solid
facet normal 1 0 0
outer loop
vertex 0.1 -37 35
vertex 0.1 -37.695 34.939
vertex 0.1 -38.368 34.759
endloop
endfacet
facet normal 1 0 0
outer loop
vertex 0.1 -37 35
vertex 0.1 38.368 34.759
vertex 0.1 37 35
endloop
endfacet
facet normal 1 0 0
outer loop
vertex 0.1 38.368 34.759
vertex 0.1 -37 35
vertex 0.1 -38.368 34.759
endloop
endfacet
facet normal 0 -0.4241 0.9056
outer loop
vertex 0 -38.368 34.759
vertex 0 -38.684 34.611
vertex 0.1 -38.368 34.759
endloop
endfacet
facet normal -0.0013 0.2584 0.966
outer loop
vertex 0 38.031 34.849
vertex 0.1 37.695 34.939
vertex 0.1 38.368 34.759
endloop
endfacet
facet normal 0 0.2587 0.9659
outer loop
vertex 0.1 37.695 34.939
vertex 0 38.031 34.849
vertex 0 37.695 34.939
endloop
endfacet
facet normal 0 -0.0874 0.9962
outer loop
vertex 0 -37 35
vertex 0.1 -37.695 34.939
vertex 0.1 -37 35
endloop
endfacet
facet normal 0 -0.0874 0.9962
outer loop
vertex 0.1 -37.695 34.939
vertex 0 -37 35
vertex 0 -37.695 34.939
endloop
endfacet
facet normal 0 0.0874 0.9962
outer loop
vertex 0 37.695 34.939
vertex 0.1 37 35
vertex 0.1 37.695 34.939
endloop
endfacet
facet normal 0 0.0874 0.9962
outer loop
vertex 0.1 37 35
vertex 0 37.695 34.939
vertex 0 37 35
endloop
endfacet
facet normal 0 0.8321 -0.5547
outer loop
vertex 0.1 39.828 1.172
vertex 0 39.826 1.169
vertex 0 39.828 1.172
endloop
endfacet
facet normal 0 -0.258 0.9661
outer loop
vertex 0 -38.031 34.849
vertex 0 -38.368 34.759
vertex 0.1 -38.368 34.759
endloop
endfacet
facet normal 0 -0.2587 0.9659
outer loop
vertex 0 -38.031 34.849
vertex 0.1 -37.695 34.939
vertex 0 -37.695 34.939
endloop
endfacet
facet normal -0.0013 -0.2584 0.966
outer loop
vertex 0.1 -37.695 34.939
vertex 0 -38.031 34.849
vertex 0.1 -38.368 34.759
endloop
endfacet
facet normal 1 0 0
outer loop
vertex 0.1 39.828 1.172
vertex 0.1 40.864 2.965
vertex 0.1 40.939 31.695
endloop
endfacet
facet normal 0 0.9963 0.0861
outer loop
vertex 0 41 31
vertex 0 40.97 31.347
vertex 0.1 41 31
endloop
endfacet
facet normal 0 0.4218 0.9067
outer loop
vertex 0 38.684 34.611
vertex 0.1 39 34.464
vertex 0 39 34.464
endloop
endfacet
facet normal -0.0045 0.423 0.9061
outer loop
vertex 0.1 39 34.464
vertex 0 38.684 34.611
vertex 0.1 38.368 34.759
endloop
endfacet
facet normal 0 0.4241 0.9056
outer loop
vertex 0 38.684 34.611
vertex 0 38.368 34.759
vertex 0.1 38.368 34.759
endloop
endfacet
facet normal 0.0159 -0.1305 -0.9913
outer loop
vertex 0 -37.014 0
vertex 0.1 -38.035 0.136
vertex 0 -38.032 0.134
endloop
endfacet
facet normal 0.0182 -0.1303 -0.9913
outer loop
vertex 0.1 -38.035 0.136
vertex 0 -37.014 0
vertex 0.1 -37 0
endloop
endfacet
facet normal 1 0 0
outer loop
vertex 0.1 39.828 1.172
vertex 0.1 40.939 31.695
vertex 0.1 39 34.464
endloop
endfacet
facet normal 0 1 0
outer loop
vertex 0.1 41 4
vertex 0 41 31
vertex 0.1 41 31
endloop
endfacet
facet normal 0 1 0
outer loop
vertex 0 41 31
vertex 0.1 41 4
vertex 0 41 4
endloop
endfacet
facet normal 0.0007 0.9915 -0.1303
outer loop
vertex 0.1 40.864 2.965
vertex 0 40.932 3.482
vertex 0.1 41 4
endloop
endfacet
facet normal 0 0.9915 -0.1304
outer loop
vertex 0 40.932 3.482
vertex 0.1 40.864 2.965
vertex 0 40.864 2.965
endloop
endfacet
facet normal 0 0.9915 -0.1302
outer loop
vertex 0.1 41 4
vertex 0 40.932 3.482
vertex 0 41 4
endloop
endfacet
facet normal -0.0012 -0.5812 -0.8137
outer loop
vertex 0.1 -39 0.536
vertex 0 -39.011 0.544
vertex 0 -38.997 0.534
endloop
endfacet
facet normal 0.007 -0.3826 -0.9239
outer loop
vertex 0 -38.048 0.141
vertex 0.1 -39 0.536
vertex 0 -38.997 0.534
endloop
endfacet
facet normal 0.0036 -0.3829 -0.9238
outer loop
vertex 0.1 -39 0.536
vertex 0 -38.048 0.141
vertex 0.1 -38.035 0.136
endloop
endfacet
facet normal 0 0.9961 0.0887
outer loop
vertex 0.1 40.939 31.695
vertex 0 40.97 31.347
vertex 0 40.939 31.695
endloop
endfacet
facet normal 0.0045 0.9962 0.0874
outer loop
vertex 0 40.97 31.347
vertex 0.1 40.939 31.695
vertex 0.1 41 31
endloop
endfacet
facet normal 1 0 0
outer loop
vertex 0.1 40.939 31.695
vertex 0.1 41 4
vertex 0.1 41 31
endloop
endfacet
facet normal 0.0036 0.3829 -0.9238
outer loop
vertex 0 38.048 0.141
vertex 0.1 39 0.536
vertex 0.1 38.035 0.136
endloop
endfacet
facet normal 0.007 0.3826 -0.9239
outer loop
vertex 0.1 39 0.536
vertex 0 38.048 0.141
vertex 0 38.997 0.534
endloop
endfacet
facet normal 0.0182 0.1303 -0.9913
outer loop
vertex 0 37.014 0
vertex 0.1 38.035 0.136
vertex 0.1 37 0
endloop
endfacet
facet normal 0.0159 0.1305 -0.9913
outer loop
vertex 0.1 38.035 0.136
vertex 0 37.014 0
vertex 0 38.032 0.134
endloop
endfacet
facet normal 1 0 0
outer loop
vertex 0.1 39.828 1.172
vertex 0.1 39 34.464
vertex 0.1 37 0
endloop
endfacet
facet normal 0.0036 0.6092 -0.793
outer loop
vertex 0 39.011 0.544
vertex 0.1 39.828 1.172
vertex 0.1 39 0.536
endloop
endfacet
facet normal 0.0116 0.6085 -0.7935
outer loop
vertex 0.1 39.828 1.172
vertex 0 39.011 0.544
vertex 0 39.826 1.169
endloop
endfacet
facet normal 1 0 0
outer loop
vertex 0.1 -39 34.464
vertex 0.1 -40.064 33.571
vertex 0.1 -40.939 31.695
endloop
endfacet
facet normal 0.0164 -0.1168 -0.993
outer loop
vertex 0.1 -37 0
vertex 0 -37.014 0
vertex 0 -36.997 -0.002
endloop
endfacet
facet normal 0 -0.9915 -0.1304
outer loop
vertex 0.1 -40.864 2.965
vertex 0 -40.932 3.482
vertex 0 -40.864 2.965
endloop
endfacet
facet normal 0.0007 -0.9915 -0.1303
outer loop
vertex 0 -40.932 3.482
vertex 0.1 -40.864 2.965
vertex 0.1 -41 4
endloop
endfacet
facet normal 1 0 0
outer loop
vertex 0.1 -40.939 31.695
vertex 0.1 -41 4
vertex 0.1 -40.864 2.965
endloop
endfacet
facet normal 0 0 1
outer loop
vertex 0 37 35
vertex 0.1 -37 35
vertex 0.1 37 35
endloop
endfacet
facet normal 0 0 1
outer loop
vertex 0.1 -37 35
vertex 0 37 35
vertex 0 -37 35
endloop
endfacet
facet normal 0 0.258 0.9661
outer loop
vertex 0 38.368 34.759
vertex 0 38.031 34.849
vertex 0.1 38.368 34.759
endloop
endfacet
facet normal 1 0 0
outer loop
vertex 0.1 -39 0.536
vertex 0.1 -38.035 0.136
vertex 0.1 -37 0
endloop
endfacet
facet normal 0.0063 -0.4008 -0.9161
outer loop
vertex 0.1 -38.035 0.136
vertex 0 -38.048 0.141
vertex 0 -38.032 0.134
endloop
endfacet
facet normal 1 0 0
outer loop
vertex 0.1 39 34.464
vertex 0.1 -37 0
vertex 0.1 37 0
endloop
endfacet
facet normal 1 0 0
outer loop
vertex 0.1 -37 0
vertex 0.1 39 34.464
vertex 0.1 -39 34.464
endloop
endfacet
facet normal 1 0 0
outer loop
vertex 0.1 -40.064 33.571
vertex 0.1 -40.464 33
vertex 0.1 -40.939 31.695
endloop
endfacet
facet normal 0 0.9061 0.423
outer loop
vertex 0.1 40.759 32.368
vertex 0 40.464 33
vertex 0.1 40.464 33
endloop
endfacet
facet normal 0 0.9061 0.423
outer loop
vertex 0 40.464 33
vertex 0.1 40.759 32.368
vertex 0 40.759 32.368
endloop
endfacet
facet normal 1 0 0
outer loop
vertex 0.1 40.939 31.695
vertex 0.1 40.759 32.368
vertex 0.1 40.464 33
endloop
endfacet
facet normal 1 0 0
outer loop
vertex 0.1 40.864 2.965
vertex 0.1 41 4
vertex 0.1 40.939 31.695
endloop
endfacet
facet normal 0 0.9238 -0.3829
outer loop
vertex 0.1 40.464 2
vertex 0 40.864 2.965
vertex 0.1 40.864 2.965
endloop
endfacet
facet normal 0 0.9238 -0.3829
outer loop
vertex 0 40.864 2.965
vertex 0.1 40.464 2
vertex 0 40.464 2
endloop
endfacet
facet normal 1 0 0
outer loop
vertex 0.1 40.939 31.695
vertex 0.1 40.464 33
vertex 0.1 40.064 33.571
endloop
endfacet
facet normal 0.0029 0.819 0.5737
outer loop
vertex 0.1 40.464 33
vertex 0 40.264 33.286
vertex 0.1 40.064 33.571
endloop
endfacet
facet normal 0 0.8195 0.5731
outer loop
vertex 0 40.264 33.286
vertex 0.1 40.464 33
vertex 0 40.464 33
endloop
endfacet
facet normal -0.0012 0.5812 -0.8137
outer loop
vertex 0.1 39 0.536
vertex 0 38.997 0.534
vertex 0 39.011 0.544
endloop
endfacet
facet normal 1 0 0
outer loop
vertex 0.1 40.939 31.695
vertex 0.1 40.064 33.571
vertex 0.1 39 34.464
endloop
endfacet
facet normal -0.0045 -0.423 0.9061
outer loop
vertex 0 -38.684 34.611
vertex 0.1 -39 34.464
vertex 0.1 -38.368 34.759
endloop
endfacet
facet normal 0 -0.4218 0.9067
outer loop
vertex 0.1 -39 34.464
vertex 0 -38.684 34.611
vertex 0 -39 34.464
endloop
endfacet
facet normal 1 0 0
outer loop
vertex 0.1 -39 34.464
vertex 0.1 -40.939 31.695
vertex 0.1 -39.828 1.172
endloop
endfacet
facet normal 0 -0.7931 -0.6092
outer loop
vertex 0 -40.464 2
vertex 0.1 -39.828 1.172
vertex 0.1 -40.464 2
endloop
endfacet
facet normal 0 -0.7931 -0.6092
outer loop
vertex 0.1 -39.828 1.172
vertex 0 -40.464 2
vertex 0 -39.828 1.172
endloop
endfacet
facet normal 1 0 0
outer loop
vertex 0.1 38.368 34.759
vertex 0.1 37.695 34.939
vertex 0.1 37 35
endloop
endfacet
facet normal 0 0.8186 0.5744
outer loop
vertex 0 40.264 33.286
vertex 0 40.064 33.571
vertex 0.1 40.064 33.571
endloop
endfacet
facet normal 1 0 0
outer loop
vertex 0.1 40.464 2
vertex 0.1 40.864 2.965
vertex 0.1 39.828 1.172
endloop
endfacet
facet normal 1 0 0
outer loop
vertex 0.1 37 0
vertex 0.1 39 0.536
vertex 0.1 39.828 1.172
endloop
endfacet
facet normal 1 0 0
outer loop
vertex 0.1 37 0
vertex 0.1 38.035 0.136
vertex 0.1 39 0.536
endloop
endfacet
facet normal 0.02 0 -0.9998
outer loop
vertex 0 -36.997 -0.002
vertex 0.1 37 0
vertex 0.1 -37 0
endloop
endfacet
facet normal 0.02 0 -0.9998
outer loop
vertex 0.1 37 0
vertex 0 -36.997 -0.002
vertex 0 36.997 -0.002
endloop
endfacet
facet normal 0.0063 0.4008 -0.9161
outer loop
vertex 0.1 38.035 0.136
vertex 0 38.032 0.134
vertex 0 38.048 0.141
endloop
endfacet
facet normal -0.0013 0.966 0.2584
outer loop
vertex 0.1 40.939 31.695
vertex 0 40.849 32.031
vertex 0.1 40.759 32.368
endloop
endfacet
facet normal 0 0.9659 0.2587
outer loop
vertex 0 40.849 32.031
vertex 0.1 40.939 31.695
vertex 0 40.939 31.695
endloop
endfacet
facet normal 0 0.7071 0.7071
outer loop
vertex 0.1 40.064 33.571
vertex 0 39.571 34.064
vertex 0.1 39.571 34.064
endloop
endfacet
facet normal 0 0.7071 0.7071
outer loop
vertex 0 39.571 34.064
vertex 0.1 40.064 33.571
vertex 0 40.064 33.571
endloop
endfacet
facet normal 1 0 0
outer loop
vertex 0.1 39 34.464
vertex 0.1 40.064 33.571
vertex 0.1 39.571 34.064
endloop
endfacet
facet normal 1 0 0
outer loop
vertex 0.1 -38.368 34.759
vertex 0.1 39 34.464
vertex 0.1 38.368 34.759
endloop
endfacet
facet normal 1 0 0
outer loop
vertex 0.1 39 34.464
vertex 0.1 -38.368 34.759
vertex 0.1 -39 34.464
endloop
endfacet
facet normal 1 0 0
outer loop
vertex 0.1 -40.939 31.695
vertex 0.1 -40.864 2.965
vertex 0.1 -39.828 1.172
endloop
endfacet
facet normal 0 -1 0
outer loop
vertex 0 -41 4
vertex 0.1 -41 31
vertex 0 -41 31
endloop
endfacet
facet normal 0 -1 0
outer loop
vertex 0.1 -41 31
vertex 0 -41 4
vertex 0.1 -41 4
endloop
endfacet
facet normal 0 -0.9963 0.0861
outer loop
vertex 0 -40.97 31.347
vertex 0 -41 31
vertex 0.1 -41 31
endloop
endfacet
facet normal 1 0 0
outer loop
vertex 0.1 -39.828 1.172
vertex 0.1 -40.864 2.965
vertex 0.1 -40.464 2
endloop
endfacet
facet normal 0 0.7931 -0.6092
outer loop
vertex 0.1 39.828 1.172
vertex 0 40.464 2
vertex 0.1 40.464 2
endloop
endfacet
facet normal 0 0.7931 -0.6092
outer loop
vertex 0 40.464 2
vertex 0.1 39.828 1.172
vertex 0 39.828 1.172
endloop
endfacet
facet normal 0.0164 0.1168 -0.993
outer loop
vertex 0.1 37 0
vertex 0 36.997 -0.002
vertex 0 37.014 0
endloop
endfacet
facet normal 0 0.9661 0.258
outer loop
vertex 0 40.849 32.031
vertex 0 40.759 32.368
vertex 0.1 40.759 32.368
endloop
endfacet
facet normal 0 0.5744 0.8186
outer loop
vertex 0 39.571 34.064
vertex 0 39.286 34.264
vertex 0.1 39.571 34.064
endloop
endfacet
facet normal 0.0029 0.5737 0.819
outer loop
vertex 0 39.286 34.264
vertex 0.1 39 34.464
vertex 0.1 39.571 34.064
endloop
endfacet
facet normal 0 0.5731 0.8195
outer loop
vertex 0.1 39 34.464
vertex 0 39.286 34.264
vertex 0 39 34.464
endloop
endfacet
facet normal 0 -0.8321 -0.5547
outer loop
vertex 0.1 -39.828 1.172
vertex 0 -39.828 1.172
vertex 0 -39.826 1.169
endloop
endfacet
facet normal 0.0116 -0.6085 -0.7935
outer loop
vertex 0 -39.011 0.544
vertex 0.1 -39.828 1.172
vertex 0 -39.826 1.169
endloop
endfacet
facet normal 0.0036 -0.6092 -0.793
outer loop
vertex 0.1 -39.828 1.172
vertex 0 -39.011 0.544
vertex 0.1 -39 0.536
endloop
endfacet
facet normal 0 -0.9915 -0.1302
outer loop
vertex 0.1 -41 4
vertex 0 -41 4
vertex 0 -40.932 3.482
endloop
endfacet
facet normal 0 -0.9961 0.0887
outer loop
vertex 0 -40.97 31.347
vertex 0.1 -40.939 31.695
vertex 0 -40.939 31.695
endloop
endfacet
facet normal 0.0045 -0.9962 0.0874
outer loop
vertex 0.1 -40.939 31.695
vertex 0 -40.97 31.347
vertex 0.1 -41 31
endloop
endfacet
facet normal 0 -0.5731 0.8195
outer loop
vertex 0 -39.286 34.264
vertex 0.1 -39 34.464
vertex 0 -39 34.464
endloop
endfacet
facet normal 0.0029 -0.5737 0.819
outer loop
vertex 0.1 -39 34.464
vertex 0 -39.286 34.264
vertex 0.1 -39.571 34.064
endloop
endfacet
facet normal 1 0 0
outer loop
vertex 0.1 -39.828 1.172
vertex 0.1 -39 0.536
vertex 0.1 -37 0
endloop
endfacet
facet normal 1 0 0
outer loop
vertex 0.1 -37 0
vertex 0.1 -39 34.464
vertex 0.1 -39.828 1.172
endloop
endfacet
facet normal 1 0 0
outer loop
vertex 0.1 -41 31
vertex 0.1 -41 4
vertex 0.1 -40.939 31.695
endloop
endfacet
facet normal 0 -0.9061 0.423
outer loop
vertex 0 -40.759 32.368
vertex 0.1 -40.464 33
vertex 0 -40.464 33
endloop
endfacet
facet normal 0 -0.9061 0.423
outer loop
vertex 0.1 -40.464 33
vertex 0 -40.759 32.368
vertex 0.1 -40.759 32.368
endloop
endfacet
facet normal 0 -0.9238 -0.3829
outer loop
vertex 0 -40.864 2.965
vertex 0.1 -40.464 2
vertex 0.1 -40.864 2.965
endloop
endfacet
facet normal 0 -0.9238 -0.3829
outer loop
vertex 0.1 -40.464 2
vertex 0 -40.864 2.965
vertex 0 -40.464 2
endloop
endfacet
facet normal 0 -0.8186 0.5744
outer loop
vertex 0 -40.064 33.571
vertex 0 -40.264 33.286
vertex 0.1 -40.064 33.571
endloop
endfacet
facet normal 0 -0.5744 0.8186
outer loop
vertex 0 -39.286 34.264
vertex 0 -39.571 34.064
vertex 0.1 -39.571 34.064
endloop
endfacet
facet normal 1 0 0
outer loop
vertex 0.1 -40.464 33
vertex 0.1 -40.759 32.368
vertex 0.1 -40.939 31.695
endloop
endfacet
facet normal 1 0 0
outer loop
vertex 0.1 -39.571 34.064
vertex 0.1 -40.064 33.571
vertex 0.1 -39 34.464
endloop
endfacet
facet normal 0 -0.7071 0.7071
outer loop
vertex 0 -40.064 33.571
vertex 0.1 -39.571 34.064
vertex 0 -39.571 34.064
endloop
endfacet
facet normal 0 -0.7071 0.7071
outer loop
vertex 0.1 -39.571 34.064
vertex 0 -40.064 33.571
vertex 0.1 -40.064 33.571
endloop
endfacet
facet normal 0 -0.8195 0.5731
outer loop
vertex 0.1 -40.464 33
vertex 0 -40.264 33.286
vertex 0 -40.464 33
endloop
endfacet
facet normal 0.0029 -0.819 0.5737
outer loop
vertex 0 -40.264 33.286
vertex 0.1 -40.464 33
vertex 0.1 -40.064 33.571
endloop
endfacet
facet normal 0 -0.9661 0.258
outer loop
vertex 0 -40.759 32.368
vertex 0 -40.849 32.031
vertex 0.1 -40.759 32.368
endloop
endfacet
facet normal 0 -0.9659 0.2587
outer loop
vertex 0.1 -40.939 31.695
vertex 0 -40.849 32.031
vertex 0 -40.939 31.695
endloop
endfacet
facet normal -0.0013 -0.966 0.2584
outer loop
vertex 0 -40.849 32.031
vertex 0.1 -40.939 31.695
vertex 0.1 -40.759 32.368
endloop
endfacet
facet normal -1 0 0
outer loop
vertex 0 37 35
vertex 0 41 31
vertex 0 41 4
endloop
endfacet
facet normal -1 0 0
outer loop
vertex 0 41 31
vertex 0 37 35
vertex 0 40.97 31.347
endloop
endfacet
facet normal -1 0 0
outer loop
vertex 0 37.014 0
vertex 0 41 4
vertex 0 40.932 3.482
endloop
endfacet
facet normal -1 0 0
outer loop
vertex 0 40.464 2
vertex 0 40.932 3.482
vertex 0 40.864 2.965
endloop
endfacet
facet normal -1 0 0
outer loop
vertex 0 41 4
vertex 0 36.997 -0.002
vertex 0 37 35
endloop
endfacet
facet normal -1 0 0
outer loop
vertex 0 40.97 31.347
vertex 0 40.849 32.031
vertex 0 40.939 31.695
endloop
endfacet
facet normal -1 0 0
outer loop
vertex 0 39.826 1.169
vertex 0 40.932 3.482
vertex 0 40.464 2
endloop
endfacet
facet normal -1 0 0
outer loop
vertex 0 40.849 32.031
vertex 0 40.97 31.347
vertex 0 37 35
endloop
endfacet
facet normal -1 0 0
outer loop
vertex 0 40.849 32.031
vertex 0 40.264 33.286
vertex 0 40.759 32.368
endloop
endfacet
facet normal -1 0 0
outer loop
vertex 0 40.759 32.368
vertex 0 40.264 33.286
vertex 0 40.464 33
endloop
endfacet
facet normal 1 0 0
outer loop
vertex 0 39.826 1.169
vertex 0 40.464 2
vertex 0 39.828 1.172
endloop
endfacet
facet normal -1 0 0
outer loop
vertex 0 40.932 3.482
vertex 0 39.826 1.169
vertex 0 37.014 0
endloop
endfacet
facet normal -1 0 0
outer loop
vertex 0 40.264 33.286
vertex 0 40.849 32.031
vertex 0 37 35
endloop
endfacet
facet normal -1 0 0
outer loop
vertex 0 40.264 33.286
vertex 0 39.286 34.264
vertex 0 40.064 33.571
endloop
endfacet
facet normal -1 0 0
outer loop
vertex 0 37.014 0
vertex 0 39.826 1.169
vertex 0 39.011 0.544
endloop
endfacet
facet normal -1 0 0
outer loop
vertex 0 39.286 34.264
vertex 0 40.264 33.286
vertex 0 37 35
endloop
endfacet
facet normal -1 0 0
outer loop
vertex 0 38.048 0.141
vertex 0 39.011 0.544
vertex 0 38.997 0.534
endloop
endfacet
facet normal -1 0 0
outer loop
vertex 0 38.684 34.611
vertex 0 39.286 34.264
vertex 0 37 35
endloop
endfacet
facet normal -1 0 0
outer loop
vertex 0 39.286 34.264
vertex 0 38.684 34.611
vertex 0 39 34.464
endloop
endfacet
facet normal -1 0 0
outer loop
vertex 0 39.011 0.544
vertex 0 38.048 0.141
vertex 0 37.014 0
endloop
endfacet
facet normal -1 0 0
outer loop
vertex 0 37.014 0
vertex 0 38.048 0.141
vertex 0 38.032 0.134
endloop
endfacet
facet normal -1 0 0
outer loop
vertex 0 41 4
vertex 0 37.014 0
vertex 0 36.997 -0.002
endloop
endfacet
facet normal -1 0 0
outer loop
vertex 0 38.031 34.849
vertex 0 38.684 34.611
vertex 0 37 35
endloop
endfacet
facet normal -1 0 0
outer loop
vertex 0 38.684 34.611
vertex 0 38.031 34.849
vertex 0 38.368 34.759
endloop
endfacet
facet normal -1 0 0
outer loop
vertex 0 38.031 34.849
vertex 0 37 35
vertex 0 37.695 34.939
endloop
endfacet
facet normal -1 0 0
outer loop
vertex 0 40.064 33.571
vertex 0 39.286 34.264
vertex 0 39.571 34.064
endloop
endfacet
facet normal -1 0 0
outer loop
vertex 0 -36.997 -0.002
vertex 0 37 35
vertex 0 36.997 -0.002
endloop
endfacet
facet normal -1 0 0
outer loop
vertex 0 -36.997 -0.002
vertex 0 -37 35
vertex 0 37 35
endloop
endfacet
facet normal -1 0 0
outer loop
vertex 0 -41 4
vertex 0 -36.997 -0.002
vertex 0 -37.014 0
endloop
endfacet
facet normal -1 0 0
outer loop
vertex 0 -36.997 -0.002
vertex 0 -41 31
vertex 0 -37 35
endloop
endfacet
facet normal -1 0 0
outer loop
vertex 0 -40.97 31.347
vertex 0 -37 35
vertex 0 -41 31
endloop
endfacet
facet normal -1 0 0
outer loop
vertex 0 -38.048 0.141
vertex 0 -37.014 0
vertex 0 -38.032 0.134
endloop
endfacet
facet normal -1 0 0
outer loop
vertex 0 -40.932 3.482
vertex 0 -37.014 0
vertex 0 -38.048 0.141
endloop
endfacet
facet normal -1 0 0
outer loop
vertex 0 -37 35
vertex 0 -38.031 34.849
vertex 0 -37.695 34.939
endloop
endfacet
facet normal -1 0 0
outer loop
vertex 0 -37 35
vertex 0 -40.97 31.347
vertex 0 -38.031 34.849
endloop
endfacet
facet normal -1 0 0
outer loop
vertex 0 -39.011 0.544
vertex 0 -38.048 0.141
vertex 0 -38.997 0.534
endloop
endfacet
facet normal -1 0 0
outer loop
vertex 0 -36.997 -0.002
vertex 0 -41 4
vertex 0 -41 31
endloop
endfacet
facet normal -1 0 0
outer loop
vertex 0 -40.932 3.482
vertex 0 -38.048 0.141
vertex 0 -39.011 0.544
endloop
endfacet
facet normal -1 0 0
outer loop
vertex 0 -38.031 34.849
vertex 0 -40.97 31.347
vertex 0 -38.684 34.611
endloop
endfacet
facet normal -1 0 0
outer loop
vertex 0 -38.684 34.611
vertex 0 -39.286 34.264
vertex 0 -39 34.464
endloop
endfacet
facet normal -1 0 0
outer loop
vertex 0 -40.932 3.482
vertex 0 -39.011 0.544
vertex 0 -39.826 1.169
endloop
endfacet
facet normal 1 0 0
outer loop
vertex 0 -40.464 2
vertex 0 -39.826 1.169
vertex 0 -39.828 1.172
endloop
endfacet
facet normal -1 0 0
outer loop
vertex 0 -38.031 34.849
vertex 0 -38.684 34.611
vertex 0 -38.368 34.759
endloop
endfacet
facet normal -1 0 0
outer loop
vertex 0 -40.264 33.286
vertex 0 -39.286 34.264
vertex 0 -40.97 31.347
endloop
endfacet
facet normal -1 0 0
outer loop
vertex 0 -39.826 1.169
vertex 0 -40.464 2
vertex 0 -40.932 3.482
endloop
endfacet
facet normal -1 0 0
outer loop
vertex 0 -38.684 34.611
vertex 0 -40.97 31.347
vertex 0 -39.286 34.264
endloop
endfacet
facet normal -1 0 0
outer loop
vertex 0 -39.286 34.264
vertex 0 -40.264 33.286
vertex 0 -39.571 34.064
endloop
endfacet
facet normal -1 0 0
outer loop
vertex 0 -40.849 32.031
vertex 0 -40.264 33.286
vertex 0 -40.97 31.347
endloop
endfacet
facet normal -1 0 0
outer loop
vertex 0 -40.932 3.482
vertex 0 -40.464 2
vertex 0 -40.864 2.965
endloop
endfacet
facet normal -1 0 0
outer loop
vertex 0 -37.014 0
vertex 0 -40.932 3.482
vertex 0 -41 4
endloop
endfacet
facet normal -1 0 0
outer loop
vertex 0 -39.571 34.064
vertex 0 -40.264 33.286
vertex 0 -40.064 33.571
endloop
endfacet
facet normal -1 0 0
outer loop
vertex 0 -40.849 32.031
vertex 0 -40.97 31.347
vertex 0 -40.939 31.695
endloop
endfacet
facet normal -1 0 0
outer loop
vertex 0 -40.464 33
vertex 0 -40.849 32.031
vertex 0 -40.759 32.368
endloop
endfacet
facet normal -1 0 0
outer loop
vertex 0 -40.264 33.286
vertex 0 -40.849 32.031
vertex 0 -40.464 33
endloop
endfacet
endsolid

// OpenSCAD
caller_part = "none";
include <collar_halter_v2.scad>;

ang = bridge_half_ang;
x_j = bridge_r_inner * sin(ang);
z_j = bridge_r_inner * cos(ang);

// Let us isolate only the bridge arch and see if it overlaps with the socket mouth!
module arch_only(n_steps=24) {
    for (i = [0 : n_steps - 1]) {
        ang1 = -bridge_half_ang + i * (2 * bridge_half_ang) / n_steps;
        ang2 = -bridge_half_ang + (i + 1) * (2 * bridge_half_ang) / n_steps;
        hull() {
            bridge_slice(ang1);
            bridge_slice(ang2);
        }
    }
}

// In the local frame of the right socket:
// Check what arch_only has inside the socket region (X > 0)
intersection() {
    rotate([0, -ang, 0])
        translate([-x_j, 0, -z_j])
            arch_only();
    translate([0, -50, -10])
        cube([50, 100, 50]);
}
